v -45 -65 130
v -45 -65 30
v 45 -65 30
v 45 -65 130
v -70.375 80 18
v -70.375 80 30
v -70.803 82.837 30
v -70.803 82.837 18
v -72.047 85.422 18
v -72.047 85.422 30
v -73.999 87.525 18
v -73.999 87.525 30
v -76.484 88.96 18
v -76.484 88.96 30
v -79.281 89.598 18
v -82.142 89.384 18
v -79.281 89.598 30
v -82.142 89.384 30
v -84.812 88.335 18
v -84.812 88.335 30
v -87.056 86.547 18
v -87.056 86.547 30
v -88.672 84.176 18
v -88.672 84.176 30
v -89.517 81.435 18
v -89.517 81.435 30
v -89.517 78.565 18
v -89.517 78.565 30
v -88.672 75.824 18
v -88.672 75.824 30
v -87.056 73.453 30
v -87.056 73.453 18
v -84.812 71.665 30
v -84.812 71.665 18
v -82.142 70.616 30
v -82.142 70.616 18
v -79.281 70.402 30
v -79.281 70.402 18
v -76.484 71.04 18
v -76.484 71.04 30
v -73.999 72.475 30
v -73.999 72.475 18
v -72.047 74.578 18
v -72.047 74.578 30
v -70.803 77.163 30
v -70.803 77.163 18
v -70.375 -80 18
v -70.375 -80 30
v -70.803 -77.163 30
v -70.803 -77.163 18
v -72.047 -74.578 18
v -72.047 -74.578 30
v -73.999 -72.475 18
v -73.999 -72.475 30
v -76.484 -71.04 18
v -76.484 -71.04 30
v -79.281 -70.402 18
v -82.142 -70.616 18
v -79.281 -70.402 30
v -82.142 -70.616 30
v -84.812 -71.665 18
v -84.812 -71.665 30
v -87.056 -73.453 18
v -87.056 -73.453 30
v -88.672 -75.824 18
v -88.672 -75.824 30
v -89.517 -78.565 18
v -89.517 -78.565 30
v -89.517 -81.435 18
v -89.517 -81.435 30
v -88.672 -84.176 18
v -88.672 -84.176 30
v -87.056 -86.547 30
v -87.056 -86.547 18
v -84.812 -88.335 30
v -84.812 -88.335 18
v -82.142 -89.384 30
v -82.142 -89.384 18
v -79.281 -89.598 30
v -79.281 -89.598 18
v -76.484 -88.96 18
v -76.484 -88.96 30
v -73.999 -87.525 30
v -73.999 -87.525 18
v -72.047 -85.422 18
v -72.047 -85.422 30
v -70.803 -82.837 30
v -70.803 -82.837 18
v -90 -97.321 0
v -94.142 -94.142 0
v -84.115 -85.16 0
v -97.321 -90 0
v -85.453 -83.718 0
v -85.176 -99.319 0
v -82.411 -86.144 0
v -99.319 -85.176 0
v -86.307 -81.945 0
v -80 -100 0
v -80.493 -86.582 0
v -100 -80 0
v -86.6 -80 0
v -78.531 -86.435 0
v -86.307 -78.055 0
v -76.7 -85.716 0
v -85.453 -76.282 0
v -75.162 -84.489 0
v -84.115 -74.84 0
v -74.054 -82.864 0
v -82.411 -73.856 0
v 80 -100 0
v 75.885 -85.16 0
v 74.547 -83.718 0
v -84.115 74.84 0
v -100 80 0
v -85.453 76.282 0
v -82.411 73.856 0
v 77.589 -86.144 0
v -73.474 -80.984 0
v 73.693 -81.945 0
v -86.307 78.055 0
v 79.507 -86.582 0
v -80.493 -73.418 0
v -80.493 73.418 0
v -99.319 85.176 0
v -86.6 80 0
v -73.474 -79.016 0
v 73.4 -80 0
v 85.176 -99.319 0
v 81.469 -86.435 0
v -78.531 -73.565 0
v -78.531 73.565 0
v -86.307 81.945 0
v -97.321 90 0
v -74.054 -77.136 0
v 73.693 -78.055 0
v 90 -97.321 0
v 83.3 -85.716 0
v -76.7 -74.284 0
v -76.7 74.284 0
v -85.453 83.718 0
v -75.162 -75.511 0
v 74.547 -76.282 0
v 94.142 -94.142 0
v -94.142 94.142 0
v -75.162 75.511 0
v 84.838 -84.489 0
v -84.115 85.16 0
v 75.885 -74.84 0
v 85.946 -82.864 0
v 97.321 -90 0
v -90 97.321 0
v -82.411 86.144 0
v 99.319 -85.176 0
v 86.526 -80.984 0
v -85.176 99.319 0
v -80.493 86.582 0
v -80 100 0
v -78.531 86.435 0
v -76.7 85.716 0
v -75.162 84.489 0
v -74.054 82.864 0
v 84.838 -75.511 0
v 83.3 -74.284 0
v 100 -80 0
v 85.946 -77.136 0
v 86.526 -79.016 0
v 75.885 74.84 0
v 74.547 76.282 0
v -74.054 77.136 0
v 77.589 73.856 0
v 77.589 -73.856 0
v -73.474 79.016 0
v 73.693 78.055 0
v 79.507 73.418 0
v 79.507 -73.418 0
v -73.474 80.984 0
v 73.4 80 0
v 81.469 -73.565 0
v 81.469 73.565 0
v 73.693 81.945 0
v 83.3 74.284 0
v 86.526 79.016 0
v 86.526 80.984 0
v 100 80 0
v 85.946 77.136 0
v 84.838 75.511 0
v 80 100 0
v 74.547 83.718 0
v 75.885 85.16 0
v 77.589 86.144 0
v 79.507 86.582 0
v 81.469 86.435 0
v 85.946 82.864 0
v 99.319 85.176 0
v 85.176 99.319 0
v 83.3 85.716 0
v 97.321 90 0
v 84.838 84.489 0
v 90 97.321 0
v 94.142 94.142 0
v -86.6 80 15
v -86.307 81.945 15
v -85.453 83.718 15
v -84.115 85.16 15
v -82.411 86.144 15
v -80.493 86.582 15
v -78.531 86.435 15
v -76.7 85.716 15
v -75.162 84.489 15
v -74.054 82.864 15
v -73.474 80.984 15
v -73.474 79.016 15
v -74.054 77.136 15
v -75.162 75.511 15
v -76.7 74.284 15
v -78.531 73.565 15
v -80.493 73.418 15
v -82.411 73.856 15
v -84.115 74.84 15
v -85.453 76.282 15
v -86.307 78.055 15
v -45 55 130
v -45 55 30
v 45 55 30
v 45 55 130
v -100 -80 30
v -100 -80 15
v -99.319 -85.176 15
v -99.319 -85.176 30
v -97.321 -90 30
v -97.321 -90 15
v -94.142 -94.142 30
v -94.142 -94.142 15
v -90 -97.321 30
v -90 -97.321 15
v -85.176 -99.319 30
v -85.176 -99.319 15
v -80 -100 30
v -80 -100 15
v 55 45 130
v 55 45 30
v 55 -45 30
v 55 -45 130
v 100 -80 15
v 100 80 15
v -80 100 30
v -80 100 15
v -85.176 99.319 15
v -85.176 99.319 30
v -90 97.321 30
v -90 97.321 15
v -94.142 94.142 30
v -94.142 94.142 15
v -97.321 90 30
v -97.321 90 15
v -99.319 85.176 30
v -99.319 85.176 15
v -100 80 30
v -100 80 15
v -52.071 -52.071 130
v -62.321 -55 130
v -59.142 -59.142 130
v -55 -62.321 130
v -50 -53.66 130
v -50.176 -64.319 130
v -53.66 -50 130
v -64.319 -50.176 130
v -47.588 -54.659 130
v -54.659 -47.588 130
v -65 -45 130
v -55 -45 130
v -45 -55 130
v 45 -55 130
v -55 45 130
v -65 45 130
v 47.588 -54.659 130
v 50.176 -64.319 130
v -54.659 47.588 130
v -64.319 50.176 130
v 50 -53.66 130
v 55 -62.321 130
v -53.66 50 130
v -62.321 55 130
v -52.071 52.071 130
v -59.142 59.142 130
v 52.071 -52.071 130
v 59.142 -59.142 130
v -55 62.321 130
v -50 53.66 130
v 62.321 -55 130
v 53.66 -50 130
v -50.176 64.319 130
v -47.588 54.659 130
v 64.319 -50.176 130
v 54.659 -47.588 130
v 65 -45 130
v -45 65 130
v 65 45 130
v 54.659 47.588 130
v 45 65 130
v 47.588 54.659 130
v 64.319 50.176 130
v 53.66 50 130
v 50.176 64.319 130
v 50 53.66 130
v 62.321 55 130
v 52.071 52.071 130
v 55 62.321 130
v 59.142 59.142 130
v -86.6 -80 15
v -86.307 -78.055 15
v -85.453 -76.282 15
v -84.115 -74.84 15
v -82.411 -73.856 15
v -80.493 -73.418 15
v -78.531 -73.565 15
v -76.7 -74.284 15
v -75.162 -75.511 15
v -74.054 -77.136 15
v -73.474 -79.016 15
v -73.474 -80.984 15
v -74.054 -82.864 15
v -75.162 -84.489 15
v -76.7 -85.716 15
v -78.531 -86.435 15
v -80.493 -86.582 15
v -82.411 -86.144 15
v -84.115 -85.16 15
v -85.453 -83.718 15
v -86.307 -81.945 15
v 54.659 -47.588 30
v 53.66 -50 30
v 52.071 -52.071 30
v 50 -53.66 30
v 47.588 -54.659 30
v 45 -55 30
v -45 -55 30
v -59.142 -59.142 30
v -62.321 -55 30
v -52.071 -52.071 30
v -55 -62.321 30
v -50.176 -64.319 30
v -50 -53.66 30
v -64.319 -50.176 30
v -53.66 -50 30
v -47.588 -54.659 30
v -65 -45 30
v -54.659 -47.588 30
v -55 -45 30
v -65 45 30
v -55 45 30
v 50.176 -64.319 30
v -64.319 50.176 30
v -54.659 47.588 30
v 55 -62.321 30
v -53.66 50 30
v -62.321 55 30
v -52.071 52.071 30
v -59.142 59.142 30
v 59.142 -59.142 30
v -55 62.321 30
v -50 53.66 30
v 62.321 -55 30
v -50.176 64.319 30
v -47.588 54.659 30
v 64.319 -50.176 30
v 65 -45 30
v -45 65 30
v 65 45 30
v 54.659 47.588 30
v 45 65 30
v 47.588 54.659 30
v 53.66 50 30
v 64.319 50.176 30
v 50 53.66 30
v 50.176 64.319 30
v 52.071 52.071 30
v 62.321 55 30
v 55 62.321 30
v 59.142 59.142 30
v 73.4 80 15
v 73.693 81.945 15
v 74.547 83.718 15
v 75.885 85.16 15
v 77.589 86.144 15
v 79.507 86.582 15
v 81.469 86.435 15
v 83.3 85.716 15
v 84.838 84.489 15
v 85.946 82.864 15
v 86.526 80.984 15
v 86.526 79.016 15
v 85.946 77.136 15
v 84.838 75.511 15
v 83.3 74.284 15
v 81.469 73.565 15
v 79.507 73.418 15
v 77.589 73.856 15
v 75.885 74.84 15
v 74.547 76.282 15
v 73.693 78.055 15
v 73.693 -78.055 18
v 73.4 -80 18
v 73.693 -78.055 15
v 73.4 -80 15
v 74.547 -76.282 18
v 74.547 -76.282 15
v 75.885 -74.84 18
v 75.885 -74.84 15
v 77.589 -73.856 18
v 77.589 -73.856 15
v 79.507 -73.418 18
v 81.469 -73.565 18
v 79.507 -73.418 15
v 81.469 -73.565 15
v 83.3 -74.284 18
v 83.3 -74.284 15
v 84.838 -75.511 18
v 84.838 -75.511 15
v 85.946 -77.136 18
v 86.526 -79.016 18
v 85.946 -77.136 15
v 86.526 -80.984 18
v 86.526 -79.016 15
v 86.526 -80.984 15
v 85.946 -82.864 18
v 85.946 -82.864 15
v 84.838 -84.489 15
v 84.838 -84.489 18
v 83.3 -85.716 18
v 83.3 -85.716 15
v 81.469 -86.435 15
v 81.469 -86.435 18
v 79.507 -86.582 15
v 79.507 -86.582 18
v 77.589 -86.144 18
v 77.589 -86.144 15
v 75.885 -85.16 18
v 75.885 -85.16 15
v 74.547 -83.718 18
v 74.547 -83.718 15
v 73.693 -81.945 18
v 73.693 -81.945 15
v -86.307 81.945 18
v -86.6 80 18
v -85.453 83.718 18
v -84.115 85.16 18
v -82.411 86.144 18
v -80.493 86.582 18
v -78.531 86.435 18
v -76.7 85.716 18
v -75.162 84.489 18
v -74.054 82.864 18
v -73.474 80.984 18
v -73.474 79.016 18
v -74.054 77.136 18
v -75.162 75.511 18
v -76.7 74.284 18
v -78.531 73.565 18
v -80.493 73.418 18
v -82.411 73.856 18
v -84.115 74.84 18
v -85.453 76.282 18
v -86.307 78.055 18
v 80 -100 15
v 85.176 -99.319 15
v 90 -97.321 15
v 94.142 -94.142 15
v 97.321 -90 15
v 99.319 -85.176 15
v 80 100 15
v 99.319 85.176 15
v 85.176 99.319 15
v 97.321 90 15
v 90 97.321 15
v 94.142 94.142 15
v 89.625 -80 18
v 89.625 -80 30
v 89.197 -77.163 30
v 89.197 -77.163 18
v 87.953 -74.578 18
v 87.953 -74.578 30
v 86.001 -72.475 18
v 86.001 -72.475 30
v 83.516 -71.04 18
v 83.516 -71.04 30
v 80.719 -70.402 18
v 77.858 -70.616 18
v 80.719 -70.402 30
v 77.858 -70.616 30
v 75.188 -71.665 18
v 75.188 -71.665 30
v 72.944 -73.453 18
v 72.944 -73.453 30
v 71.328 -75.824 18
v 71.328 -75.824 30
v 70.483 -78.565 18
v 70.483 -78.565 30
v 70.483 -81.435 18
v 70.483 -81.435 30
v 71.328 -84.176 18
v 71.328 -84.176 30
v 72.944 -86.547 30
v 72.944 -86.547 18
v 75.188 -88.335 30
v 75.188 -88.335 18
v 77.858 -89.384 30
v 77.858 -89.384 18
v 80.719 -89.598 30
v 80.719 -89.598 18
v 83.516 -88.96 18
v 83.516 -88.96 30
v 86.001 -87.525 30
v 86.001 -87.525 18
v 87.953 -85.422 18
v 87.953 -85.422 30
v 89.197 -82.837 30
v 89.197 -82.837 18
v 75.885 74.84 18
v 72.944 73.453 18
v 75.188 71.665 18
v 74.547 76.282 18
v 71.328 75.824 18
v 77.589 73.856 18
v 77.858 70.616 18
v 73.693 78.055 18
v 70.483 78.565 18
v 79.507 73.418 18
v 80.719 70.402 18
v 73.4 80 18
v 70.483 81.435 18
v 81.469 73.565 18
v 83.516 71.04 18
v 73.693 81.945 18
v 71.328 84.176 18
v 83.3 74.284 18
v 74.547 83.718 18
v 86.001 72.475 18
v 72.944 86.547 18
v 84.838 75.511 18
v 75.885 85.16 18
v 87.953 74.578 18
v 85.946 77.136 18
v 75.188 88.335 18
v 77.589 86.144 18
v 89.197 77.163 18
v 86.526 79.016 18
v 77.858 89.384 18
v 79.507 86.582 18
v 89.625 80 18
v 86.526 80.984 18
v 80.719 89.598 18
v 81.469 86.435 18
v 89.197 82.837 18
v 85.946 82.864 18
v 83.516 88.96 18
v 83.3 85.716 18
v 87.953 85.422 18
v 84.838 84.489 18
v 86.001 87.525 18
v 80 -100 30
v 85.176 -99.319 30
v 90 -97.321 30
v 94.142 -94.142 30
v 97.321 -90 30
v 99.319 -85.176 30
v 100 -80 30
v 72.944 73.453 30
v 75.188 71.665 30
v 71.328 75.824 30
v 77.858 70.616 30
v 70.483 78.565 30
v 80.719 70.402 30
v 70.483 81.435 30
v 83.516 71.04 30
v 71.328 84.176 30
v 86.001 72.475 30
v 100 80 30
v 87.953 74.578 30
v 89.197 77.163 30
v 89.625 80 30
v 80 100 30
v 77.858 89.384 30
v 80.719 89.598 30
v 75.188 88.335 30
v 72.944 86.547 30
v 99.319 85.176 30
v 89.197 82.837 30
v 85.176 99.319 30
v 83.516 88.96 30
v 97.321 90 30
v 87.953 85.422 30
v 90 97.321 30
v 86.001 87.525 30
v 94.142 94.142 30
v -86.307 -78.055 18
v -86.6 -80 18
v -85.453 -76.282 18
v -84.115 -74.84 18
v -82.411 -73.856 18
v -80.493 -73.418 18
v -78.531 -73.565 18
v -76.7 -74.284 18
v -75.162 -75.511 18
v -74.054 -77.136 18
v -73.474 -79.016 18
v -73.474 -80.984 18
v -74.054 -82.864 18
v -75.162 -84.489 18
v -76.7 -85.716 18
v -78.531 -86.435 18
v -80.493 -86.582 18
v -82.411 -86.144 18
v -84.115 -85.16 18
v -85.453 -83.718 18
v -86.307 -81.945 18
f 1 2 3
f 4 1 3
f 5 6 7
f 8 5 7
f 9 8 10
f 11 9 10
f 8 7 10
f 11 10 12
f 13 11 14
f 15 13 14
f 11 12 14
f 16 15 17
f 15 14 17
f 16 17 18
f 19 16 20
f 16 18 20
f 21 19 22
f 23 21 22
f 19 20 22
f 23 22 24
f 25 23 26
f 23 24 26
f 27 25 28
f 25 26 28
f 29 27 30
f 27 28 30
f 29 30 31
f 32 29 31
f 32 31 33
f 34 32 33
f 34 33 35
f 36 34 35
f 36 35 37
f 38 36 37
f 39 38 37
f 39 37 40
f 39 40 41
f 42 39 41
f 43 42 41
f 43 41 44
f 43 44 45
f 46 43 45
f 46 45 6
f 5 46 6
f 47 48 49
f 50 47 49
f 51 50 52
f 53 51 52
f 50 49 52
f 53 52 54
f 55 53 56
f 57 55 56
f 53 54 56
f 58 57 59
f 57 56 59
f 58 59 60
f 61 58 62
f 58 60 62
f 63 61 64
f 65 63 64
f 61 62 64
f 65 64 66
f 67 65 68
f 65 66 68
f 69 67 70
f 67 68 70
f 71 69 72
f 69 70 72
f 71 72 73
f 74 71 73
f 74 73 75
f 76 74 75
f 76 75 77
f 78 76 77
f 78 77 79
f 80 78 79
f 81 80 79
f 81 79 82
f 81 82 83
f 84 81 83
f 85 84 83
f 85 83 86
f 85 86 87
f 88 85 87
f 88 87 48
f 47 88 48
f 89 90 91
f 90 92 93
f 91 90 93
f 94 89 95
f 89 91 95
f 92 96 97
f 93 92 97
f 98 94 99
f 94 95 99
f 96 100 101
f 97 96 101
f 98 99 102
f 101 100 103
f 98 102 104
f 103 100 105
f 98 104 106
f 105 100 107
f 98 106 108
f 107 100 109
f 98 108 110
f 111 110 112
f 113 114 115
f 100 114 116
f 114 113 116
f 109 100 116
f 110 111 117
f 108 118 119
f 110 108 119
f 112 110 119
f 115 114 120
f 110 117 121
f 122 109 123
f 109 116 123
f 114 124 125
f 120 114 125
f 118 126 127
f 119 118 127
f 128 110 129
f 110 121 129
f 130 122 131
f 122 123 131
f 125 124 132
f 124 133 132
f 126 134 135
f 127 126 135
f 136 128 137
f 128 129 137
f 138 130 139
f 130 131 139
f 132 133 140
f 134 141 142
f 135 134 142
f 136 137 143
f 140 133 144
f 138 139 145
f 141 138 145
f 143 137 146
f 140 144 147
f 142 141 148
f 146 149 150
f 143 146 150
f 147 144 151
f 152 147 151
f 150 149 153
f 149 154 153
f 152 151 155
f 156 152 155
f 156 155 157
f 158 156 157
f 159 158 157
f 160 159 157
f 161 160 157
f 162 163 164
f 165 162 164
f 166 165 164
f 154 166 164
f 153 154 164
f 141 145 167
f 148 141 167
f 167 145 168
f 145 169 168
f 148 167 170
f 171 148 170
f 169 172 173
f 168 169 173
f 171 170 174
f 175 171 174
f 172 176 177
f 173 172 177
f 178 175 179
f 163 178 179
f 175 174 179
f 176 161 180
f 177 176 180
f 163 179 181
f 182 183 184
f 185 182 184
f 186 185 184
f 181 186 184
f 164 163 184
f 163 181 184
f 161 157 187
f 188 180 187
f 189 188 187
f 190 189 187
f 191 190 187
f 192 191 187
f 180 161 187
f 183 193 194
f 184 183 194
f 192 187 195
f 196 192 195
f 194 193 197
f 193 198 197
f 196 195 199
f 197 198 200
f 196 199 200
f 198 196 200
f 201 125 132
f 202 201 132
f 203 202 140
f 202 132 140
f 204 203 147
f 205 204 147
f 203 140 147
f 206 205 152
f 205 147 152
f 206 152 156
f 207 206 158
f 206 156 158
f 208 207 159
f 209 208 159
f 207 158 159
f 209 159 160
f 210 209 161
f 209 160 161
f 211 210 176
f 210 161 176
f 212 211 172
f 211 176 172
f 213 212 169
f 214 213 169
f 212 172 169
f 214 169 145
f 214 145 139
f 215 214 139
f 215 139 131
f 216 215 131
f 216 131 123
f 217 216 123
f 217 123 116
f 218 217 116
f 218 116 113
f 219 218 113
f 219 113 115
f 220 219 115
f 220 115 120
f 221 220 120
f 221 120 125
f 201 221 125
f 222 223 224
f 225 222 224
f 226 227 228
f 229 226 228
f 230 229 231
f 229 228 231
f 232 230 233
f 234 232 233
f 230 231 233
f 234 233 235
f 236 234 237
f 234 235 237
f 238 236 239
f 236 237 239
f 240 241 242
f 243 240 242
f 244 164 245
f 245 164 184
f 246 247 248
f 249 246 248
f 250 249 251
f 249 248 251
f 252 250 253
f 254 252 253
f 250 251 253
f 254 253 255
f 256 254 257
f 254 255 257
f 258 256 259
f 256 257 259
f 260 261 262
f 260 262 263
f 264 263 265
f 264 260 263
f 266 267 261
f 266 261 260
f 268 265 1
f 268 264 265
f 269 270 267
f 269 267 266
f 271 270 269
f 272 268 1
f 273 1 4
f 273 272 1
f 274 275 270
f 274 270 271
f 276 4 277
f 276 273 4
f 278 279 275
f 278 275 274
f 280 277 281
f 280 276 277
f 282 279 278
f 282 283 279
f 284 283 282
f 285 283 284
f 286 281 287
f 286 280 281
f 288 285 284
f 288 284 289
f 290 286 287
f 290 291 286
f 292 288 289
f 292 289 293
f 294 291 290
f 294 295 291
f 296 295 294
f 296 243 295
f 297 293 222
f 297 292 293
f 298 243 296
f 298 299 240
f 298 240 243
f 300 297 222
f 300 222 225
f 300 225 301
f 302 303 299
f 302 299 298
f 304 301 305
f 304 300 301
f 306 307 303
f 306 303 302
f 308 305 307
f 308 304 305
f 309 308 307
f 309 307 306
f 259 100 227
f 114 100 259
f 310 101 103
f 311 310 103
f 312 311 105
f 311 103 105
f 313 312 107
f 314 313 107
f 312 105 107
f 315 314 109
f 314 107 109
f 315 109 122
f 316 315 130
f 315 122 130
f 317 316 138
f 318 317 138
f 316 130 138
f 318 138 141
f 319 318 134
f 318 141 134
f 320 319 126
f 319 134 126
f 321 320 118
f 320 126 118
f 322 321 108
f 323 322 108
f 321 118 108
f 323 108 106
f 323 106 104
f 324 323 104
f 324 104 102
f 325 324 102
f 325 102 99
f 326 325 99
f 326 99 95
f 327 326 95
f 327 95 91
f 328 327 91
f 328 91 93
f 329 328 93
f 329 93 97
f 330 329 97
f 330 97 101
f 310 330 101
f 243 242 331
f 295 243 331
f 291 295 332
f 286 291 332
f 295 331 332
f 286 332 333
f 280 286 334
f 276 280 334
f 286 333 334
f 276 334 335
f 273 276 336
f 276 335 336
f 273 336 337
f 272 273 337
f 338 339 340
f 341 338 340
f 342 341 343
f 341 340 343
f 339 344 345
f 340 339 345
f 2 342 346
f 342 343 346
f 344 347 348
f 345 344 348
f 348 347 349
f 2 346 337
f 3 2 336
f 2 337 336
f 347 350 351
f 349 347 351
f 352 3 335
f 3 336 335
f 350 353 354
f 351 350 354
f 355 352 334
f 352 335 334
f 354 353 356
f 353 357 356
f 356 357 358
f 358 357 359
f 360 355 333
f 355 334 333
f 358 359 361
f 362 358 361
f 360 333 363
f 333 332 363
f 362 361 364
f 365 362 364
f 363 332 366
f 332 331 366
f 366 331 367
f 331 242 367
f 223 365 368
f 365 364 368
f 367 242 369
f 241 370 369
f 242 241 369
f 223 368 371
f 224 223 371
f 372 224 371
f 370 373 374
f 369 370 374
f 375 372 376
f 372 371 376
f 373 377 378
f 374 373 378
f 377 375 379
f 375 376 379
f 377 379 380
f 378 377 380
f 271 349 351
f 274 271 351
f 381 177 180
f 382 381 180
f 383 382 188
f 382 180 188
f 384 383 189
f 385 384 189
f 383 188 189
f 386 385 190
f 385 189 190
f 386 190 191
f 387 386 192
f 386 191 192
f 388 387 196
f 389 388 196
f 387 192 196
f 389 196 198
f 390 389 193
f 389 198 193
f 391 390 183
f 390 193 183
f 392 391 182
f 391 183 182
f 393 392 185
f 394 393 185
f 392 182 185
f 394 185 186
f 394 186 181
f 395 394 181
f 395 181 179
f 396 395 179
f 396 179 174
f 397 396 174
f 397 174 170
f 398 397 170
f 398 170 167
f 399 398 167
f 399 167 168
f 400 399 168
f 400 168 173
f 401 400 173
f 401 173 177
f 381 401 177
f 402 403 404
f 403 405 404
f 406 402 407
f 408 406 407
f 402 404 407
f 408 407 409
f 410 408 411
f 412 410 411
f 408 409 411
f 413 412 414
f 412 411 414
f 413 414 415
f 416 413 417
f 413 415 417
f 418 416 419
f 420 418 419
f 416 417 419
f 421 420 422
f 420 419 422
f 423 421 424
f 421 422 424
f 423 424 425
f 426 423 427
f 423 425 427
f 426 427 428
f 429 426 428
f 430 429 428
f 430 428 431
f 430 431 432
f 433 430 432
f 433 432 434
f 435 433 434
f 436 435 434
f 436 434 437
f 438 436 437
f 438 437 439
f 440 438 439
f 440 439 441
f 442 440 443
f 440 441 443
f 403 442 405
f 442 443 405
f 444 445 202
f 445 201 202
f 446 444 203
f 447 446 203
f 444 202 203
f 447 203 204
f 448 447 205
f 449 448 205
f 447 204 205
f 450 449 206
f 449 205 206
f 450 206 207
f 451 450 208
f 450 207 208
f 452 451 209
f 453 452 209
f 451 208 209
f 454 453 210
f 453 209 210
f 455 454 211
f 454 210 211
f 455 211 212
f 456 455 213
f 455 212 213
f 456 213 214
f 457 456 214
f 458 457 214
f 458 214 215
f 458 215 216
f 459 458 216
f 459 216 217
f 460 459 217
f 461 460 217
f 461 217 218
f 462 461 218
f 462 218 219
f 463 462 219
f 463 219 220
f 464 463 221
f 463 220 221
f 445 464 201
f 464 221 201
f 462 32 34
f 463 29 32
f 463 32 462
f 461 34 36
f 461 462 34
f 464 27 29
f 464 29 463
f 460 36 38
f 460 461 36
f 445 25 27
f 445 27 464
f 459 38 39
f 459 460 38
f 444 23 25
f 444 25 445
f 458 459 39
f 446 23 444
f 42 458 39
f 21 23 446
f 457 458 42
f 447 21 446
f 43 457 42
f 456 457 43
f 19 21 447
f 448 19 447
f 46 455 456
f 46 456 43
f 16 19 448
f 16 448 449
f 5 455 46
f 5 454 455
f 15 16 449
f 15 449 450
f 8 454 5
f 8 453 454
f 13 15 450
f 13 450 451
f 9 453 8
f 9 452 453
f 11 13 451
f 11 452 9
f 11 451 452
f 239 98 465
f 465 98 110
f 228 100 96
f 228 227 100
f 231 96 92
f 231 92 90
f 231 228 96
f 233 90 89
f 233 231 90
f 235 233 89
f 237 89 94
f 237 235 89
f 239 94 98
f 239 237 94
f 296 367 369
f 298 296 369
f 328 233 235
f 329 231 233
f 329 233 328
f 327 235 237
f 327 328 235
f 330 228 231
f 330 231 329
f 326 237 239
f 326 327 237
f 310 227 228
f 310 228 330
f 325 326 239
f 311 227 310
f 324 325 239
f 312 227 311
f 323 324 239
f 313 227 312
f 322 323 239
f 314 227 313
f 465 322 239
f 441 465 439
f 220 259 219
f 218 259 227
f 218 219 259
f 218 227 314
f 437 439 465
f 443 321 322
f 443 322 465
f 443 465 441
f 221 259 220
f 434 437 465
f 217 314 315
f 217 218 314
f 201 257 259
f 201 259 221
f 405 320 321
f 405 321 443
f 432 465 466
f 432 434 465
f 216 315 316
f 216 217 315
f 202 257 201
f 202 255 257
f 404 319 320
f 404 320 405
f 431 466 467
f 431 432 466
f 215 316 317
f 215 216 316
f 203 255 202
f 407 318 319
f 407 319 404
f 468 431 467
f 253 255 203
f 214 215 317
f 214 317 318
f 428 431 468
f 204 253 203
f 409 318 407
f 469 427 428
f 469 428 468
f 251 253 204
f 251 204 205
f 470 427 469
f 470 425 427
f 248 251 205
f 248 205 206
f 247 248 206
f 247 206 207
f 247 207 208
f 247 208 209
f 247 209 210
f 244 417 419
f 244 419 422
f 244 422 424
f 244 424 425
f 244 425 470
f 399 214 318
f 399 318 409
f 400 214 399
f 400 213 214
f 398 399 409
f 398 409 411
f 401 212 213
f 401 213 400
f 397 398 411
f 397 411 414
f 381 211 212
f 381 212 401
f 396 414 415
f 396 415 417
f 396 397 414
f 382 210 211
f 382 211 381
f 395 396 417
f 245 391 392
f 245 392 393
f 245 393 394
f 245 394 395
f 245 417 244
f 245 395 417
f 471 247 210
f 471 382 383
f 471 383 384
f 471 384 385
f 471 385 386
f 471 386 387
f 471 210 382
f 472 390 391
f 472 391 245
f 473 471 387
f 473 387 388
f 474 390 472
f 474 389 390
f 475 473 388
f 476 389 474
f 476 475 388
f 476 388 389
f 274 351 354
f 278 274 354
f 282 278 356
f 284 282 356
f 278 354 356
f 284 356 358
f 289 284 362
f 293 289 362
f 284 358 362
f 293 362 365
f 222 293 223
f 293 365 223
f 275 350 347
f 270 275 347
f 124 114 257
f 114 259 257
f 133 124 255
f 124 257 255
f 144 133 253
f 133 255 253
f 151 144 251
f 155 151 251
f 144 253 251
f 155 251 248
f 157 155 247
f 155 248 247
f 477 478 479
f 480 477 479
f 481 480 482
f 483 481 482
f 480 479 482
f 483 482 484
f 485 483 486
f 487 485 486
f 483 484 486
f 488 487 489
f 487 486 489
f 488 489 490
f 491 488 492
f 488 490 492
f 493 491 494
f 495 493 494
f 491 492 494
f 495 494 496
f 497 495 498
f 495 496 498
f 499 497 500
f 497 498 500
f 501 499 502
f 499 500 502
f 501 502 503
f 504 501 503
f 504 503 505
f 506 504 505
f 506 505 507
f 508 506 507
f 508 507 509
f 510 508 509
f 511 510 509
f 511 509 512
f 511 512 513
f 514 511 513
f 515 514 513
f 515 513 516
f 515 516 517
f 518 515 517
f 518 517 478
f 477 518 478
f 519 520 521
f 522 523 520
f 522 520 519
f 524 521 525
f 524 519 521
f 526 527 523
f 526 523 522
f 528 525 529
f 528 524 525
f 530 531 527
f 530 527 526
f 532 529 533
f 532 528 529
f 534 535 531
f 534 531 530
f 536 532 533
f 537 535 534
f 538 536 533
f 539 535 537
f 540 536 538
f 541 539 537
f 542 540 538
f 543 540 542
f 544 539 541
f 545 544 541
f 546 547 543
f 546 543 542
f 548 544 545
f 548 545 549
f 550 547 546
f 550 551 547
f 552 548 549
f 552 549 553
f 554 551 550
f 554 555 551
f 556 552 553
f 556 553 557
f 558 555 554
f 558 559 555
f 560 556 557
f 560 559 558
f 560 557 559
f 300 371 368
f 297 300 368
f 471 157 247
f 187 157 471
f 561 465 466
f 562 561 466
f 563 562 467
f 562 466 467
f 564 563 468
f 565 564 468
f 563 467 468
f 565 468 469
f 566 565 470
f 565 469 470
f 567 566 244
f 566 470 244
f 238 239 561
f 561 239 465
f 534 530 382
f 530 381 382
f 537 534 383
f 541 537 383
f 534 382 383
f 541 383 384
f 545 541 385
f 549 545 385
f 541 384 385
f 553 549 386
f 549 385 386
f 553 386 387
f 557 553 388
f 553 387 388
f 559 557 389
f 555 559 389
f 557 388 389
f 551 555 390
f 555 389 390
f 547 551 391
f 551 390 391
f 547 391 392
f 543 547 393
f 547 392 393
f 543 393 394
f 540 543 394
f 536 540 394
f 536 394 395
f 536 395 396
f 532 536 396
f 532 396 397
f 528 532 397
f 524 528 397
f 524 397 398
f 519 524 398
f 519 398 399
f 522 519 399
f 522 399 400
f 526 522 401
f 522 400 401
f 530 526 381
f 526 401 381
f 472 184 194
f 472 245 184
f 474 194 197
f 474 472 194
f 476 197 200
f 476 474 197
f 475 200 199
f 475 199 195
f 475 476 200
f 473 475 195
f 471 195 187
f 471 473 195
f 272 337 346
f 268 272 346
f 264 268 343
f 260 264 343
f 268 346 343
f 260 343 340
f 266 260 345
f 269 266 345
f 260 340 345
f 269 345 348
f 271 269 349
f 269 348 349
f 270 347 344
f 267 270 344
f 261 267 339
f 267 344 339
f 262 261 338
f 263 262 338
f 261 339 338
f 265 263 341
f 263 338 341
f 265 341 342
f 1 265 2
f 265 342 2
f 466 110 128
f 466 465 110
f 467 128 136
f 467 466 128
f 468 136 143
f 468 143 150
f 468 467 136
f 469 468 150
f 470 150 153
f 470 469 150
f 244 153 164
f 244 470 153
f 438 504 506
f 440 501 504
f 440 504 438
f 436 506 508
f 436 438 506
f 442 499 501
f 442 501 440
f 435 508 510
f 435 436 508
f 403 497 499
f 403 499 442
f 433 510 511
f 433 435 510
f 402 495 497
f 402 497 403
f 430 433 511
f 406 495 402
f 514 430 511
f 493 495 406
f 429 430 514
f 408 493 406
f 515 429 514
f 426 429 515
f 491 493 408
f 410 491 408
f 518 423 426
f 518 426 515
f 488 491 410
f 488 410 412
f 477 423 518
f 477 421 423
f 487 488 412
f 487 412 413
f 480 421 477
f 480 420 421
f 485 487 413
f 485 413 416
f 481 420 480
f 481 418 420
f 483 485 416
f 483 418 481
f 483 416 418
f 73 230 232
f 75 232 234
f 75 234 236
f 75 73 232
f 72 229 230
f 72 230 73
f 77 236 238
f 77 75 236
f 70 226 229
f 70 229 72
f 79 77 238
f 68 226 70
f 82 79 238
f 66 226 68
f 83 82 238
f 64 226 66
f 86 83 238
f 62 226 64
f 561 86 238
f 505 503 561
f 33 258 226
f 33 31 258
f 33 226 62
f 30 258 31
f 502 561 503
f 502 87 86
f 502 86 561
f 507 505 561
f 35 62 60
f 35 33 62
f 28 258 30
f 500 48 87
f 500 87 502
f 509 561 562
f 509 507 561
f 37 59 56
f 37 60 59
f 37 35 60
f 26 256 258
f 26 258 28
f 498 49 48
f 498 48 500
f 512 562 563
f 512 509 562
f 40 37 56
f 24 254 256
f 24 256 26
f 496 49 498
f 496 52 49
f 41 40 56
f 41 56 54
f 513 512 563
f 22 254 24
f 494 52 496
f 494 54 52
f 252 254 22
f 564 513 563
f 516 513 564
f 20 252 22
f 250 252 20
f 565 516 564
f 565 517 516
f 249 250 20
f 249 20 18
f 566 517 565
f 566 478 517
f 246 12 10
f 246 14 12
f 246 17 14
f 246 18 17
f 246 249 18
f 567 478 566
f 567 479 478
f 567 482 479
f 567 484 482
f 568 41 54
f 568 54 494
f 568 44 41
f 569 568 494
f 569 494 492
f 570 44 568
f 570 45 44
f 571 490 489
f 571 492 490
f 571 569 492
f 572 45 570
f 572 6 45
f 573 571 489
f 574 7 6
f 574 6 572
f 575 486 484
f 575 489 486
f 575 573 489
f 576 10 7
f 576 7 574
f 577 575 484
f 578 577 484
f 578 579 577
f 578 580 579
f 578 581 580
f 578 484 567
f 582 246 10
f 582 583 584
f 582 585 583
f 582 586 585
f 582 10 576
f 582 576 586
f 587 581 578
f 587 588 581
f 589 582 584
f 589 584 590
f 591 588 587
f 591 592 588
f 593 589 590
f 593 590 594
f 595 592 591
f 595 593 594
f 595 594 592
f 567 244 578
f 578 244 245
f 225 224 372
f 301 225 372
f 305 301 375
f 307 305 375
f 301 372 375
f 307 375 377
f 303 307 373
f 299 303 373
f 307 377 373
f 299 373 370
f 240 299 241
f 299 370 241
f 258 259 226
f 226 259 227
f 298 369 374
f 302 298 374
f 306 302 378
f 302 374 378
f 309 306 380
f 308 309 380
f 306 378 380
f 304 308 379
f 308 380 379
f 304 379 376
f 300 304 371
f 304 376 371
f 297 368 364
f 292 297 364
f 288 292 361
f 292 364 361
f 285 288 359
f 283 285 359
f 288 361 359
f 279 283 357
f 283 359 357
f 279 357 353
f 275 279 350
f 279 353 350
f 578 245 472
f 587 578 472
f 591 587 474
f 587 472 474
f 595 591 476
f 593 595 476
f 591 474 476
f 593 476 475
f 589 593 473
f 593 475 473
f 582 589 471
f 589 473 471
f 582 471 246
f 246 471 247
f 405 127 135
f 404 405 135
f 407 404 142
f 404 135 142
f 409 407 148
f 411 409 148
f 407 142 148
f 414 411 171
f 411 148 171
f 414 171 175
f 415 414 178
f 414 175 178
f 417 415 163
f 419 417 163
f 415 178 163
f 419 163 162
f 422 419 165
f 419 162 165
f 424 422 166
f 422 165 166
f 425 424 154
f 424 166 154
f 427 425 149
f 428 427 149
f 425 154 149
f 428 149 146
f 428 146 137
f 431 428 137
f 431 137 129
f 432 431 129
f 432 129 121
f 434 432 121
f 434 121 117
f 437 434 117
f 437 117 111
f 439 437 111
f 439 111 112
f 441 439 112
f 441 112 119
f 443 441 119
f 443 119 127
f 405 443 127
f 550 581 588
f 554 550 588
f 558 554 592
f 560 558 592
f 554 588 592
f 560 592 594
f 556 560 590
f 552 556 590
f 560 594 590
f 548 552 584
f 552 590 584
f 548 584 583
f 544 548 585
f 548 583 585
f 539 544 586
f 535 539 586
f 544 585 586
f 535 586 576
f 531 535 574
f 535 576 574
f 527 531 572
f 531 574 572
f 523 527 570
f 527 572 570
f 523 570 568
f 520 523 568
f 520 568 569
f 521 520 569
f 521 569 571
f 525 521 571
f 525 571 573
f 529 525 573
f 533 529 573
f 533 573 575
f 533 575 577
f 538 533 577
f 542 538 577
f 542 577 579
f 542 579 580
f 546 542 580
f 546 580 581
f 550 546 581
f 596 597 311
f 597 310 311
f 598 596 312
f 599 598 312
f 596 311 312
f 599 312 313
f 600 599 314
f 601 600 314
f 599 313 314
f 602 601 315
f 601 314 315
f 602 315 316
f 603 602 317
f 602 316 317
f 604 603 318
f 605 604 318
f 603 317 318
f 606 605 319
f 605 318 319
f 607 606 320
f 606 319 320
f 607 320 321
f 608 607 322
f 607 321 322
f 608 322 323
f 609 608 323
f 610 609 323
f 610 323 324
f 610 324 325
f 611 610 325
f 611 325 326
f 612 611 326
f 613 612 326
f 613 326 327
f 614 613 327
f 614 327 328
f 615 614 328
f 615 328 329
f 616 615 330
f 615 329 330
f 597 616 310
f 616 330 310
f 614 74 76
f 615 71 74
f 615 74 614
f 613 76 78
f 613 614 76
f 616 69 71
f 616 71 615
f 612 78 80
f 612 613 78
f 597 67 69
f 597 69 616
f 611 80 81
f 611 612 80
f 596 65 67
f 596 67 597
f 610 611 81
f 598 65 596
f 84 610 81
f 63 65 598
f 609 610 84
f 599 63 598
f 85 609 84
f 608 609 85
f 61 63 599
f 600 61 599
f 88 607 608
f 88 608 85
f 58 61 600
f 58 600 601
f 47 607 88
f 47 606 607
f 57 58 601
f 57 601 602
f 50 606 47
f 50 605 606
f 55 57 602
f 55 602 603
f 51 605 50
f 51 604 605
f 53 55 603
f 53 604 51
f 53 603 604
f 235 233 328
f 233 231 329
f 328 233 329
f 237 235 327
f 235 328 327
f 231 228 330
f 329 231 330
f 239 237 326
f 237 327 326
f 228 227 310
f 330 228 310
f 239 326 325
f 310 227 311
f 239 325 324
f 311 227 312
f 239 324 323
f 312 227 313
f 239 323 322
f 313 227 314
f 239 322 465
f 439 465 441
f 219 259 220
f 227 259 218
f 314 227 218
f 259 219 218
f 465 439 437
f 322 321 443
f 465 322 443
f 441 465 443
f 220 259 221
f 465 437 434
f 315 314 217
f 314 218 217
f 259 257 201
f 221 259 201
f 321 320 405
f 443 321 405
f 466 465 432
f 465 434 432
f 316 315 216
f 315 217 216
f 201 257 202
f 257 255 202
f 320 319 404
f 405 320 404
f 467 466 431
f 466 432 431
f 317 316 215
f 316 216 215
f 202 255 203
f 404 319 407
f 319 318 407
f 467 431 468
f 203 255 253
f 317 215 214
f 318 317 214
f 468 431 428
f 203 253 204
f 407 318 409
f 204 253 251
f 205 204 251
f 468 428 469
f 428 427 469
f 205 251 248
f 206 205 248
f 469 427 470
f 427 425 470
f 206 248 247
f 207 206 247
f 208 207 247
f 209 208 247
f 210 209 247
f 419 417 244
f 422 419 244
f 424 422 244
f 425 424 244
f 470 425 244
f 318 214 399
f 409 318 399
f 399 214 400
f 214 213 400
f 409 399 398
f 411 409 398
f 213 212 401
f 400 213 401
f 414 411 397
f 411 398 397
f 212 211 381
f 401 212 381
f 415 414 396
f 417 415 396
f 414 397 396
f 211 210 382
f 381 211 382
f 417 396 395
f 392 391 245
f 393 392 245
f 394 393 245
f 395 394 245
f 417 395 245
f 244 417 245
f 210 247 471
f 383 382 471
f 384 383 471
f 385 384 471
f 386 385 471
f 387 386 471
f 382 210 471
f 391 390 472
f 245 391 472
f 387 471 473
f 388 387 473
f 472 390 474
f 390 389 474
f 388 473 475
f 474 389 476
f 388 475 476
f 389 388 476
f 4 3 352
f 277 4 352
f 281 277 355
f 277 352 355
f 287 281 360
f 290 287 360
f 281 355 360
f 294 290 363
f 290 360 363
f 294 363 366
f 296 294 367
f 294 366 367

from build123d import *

# Parameters (mm, degrees)
F0_W           = 200
F0_H           = 200
F1_DEPTH       = 15
F2_R           = 20
F4_D           = 13.2
F6_DEPTH       = 15
F8_D           = 13.2
F8_CBORE_D     = 19.25
F8_CBORE_DEPTH = 12
F10_DEPTH      = 100


with BuildPart() as f1:
    # F0 (on Top) → F1 (new body)
    with BuildSketch(Plane.XY):
        Rectangle(F0_W, F0_H)
    extrude(amount=F1_DEPTH)

    # F2
    f2_edges = [f1.edges().sort_by_distance(p)[0] for p in [
        (100, -100, 7.5),
        (100, 100, 7.5),
        (-100, -100, 7.5),
        (-100, 100, 7.5),
    ]]
    fillet(f2_edges, radius=F2_R)

    # F4 (through all)
    with Locations(Plane.XY.offset(15)):
        with Locations((80, 80), (-80, 80), (-80, -80), (80, -80)):
            Hole(F4_D / 2)


with BuildPart() as f6:
    # F5 (on face) → F6 (new body)
    with BuildSketch(Plane.XY.offset(15)):
        with BuildLine():
            Line((-100, 80), (-100, -80))
            ThreePointArc((-100, -80), (-94.142136, -94.142136), (-80, -100))
            Line((-80, -100), (80, -100))
            ThreePointArc((80, -100), (94.142136, -94.142136), (100, -80))
            Line((100, -80), (100, 80))
            ThreePointArc((100, 80), (94.142136, 94.142136), (80, 100))
            Line((80, 100), (-80, 100))
            ThreePointArc((-80, 100), (-94.142136, 94.142136), (-100, 80))
        make_face()
    extrude(amount=F6_DEPTH)

    # F8 (through all)
    with Locations(Plane.XY.offset(30)):
        with Locations((-80, -80), (-80, 80), (80, 80), (80, -80)):
            CounterBoreHole(F8_D / 2, F8_CBORE_D / 2, F8_CBORE_DEPTH)


with BuildPart() as f10:
    # F9 (on face) → F10 (new body)
    with BuildSketch(Plane.XY.offset(30)):
        with BuildLine():
            Line((-45, -65), (45, -65))
            ThreePointArc((45, -65), (59.142136, -59.142136), (65, -45))
            Line((65, -45), (65, 45))
            ThreePointArc((65, 45), (59.142136, 59.142136), (45, 65))
            Line((45, 65), (-45, 65))
            ThreePointArc((-45, 65), (-59.142136, 59.142136), (-65, 45))
            Line((-65, 45), (-65, -45))
            ThreePointArc((-65, -45), (-59.142136, -59.142136), (-45, -65))
        make_face()
        with BuildLine():
            Line((-45, 55), (45, 55))
            ThreePointArc((45, 55), (52.071068, 52.071068), (55, 45))
            Line((55, 45), (55, -45))
            ThreePointArc((55, -45), (52.071068, -52.071068), (45, -55))
            Line((45, -55), (-45, -55))
            ThreePointArc((-45, -55), (-52.071068, -52.071068), (-55, -45))
            Line((-55, -45), (-55, 45))
            ThreePointArc((-55, 45), (-52.071068, 52.071068), (-45, 55))
        make_face(mode=Mode.SUBTRACT)
    extrude(amount=F10_DEPTH)


solid = Compound([f1.part, f6.part, f10.part])
